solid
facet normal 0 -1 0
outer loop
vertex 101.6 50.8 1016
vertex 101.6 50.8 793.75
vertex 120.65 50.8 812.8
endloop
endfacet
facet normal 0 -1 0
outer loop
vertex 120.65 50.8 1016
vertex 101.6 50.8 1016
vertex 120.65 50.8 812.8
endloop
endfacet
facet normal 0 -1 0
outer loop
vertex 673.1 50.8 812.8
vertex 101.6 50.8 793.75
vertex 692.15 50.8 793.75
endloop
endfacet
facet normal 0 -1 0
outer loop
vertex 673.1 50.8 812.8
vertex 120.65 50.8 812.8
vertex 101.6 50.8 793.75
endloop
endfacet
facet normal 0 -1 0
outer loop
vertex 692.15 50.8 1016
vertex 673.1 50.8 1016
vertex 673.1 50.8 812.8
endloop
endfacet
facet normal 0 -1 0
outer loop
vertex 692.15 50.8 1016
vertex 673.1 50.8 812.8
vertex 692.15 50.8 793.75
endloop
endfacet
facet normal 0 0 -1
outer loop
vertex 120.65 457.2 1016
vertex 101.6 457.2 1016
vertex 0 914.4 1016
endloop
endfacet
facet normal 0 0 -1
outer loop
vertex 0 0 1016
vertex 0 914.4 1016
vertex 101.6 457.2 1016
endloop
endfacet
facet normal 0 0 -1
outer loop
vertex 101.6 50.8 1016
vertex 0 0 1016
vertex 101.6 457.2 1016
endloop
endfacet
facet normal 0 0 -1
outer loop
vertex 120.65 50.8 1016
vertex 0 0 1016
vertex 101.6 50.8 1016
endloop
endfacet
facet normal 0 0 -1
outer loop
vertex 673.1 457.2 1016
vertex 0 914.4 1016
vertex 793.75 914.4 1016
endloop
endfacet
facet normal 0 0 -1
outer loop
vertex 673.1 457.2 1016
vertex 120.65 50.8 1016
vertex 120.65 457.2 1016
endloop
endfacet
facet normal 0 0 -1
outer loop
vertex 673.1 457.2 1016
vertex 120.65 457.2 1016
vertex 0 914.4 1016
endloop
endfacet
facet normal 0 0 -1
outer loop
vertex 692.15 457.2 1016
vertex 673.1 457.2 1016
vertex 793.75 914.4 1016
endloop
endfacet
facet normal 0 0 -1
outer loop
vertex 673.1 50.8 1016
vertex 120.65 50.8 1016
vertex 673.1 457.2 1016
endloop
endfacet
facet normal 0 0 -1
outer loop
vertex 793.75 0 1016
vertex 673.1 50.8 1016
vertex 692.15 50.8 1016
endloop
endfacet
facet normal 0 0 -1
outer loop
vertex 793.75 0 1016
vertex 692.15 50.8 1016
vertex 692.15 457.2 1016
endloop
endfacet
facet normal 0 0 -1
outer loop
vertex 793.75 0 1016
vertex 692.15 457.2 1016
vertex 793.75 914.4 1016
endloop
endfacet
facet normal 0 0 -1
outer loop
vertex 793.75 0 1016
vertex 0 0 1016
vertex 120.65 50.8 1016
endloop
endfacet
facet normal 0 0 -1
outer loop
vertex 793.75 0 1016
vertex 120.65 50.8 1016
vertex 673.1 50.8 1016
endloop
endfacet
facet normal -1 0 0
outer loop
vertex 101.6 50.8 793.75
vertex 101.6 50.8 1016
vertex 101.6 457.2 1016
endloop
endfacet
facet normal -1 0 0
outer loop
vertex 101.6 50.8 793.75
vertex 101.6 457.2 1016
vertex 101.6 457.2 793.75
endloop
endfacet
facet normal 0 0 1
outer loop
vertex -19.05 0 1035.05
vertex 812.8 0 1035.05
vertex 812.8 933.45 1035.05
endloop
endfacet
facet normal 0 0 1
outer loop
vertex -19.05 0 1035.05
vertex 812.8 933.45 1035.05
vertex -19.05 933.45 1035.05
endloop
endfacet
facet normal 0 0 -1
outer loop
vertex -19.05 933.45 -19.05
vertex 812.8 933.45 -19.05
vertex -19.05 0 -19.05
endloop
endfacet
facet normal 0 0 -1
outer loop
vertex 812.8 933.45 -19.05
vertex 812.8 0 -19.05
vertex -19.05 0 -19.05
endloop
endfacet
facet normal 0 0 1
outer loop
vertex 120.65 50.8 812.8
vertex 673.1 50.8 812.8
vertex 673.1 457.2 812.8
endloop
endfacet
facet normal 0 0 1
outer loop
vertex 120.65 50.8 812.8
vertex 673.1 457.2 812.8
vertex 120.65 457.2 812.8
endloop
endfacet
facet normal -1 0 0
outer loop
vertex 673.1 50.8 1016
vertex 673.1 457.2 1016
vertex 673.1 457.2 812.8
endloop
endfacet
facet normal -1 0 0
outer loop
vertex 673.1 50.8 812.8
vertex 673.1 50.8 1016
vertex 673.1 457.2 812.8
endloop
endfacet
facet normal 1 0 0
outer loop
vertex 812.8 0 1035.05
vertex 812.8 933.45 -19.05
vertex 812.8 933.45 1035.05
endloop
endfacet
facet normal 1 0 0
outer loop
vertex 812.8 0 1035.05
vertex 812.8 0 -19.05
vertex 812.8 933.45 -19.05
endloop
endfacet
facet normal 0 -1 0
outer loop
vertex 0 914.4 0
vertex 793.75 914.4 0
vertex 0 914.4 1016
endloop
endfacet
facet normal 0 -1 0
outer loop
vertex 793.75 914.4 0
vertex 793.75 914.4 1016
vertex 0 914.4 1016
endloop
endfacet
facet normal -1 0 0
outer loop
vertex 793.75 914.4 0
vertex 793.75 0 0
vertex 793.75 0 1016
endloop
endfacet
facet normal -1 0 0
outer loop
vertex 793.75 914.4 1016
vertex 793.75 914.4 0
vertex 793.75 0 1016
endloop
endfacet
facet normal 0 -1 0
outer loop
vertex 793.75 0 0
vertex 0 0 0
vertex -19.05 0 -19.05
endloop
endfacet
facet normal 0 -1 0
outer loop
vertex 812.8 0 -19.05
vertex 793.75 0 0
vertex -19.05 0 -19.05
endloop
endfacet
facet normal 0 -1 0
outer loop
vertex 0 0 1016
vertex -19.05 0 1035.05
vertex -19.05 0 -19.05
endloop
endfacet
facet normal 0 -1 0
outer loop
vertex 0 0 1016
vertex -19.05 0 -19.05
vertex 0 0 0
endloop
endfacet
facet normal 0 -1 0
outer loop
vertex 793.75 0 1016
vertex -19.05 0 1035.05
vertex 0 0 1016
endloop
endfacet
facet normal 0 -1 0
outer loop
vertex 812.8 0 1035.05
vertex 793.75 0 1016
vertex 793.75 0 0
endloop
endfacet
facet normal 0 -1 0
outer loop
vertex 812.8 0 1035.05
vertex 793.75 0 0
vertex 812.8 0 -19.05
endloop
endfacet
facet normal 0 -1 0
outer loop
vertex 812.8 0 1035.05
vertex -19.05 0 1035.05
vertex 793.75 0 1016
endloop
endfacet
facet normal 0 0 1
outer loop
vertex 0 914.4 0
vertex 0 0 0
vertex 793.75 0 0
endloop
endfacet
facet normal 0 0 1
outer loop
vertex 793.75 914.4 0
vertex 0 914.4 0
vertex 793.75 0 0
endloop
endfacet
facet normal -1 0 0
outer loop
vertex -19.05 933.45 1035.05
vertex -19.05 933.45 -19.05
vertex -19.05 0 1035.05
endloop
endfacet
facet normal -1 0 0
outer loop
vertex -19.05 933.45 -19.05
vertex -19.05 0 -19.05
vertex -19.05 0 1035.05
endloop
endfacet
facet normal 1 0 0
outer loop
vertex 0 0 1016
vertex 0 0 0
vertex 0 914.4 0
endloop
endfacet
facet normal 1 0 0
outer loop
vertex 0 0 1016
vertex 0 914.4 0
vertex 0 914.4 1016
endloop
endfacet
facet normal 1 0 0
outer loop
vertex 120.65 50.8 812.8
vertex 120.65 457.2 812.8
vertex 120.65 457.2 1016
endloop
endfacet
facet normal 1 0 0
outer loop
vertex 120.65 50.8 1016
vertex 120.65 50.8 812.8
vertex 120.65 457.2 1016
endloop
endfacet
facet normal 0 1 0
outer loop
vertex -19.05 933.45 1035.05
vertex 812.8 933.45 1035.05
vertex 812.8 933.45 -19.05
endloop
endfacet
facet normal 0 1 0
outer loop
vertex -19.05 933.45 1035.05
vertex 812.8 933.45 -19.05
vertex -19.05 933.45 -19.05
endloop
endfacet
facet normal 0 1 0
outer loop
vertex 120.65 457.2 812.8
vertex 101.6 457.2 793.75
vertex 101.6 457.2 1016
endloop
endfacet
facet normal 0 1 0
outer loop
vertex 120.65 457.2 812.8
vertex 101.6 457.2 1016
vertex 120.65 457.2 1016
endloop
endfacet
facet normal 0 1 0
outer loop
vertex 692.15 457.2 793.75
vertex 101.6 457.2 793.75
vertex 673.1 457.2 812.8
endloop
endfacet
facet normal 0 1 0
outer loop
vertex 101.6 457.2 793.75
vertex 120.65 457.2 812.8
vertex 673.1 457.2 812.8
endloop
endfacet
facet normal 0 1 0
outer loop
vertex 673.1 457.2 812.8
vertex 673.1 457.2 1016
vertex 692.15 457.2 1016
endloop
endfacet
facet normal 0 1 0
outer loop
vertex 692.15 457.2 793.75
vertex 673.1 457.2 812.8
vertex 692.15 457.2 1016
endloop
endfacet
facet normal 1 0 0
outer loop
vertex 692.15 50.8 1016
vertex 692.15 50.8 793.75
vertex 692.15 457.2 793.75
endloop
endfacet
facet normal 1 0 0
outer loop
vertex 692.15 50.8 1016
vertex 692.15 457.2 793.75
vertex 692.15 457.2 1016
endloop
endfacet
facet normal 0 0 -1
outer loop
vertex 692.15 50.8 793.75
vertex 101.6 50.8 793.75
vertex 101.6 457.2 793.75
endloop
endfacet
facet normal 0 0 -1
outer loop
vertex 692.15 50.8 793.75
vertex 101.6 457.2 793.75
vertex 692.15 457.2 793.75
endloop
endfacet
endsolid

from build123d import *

# Parameters (mm, degrees)
F0_W     = 831.85
F0_H     = 1054.1
F0_W_2   = 793.75
F0_H_2   = 1016
F1_DEPTH = 914.4
F2_W     = 831.85
F2_H     = 1054.1
F3_DEPTH = 19.05
F6_DEPTH = 406.4


with BuildPart() as f1:
    # F0 (on Front) → F1 (new body)
    with BuildSketch(Plane.XZ):
        with Locations((396.875, 508)):
            Rectangle(F0_W, F0_H)
        with Locations((396.875, 508)):
            Rectangle(F0_W_2, F0_H_2, mode=Mode.SUBTRACT)
    extrude(amount=-F1_DEPTH)

    # F2 (on face) → F3 (join)
    with BuildSketch(Plane(origin=(0, 914.4, 0), x_dir=(-1, 0, 0), z_dir=(0, 1, 0))):
        with Locations((-396.875, 508)):
            Rectangle(F2_W, F2_H)
    extrude(amount=F3_DEPTH)

    # F5 (on offset) → F6 (join)
    with BuildSketch(Plane.XZ.offset(-50.8)):
        Polygon((120.65, 1016), (101.6, 1016), (101.6, 793.75), (692.15, 793.75), (692.15, 1016), (673.1, 1016), (673.1, 812.8), (120.65, 812.8), align=None)
    extrude(amount=-F6_DEPTH)


solid = f1.part
